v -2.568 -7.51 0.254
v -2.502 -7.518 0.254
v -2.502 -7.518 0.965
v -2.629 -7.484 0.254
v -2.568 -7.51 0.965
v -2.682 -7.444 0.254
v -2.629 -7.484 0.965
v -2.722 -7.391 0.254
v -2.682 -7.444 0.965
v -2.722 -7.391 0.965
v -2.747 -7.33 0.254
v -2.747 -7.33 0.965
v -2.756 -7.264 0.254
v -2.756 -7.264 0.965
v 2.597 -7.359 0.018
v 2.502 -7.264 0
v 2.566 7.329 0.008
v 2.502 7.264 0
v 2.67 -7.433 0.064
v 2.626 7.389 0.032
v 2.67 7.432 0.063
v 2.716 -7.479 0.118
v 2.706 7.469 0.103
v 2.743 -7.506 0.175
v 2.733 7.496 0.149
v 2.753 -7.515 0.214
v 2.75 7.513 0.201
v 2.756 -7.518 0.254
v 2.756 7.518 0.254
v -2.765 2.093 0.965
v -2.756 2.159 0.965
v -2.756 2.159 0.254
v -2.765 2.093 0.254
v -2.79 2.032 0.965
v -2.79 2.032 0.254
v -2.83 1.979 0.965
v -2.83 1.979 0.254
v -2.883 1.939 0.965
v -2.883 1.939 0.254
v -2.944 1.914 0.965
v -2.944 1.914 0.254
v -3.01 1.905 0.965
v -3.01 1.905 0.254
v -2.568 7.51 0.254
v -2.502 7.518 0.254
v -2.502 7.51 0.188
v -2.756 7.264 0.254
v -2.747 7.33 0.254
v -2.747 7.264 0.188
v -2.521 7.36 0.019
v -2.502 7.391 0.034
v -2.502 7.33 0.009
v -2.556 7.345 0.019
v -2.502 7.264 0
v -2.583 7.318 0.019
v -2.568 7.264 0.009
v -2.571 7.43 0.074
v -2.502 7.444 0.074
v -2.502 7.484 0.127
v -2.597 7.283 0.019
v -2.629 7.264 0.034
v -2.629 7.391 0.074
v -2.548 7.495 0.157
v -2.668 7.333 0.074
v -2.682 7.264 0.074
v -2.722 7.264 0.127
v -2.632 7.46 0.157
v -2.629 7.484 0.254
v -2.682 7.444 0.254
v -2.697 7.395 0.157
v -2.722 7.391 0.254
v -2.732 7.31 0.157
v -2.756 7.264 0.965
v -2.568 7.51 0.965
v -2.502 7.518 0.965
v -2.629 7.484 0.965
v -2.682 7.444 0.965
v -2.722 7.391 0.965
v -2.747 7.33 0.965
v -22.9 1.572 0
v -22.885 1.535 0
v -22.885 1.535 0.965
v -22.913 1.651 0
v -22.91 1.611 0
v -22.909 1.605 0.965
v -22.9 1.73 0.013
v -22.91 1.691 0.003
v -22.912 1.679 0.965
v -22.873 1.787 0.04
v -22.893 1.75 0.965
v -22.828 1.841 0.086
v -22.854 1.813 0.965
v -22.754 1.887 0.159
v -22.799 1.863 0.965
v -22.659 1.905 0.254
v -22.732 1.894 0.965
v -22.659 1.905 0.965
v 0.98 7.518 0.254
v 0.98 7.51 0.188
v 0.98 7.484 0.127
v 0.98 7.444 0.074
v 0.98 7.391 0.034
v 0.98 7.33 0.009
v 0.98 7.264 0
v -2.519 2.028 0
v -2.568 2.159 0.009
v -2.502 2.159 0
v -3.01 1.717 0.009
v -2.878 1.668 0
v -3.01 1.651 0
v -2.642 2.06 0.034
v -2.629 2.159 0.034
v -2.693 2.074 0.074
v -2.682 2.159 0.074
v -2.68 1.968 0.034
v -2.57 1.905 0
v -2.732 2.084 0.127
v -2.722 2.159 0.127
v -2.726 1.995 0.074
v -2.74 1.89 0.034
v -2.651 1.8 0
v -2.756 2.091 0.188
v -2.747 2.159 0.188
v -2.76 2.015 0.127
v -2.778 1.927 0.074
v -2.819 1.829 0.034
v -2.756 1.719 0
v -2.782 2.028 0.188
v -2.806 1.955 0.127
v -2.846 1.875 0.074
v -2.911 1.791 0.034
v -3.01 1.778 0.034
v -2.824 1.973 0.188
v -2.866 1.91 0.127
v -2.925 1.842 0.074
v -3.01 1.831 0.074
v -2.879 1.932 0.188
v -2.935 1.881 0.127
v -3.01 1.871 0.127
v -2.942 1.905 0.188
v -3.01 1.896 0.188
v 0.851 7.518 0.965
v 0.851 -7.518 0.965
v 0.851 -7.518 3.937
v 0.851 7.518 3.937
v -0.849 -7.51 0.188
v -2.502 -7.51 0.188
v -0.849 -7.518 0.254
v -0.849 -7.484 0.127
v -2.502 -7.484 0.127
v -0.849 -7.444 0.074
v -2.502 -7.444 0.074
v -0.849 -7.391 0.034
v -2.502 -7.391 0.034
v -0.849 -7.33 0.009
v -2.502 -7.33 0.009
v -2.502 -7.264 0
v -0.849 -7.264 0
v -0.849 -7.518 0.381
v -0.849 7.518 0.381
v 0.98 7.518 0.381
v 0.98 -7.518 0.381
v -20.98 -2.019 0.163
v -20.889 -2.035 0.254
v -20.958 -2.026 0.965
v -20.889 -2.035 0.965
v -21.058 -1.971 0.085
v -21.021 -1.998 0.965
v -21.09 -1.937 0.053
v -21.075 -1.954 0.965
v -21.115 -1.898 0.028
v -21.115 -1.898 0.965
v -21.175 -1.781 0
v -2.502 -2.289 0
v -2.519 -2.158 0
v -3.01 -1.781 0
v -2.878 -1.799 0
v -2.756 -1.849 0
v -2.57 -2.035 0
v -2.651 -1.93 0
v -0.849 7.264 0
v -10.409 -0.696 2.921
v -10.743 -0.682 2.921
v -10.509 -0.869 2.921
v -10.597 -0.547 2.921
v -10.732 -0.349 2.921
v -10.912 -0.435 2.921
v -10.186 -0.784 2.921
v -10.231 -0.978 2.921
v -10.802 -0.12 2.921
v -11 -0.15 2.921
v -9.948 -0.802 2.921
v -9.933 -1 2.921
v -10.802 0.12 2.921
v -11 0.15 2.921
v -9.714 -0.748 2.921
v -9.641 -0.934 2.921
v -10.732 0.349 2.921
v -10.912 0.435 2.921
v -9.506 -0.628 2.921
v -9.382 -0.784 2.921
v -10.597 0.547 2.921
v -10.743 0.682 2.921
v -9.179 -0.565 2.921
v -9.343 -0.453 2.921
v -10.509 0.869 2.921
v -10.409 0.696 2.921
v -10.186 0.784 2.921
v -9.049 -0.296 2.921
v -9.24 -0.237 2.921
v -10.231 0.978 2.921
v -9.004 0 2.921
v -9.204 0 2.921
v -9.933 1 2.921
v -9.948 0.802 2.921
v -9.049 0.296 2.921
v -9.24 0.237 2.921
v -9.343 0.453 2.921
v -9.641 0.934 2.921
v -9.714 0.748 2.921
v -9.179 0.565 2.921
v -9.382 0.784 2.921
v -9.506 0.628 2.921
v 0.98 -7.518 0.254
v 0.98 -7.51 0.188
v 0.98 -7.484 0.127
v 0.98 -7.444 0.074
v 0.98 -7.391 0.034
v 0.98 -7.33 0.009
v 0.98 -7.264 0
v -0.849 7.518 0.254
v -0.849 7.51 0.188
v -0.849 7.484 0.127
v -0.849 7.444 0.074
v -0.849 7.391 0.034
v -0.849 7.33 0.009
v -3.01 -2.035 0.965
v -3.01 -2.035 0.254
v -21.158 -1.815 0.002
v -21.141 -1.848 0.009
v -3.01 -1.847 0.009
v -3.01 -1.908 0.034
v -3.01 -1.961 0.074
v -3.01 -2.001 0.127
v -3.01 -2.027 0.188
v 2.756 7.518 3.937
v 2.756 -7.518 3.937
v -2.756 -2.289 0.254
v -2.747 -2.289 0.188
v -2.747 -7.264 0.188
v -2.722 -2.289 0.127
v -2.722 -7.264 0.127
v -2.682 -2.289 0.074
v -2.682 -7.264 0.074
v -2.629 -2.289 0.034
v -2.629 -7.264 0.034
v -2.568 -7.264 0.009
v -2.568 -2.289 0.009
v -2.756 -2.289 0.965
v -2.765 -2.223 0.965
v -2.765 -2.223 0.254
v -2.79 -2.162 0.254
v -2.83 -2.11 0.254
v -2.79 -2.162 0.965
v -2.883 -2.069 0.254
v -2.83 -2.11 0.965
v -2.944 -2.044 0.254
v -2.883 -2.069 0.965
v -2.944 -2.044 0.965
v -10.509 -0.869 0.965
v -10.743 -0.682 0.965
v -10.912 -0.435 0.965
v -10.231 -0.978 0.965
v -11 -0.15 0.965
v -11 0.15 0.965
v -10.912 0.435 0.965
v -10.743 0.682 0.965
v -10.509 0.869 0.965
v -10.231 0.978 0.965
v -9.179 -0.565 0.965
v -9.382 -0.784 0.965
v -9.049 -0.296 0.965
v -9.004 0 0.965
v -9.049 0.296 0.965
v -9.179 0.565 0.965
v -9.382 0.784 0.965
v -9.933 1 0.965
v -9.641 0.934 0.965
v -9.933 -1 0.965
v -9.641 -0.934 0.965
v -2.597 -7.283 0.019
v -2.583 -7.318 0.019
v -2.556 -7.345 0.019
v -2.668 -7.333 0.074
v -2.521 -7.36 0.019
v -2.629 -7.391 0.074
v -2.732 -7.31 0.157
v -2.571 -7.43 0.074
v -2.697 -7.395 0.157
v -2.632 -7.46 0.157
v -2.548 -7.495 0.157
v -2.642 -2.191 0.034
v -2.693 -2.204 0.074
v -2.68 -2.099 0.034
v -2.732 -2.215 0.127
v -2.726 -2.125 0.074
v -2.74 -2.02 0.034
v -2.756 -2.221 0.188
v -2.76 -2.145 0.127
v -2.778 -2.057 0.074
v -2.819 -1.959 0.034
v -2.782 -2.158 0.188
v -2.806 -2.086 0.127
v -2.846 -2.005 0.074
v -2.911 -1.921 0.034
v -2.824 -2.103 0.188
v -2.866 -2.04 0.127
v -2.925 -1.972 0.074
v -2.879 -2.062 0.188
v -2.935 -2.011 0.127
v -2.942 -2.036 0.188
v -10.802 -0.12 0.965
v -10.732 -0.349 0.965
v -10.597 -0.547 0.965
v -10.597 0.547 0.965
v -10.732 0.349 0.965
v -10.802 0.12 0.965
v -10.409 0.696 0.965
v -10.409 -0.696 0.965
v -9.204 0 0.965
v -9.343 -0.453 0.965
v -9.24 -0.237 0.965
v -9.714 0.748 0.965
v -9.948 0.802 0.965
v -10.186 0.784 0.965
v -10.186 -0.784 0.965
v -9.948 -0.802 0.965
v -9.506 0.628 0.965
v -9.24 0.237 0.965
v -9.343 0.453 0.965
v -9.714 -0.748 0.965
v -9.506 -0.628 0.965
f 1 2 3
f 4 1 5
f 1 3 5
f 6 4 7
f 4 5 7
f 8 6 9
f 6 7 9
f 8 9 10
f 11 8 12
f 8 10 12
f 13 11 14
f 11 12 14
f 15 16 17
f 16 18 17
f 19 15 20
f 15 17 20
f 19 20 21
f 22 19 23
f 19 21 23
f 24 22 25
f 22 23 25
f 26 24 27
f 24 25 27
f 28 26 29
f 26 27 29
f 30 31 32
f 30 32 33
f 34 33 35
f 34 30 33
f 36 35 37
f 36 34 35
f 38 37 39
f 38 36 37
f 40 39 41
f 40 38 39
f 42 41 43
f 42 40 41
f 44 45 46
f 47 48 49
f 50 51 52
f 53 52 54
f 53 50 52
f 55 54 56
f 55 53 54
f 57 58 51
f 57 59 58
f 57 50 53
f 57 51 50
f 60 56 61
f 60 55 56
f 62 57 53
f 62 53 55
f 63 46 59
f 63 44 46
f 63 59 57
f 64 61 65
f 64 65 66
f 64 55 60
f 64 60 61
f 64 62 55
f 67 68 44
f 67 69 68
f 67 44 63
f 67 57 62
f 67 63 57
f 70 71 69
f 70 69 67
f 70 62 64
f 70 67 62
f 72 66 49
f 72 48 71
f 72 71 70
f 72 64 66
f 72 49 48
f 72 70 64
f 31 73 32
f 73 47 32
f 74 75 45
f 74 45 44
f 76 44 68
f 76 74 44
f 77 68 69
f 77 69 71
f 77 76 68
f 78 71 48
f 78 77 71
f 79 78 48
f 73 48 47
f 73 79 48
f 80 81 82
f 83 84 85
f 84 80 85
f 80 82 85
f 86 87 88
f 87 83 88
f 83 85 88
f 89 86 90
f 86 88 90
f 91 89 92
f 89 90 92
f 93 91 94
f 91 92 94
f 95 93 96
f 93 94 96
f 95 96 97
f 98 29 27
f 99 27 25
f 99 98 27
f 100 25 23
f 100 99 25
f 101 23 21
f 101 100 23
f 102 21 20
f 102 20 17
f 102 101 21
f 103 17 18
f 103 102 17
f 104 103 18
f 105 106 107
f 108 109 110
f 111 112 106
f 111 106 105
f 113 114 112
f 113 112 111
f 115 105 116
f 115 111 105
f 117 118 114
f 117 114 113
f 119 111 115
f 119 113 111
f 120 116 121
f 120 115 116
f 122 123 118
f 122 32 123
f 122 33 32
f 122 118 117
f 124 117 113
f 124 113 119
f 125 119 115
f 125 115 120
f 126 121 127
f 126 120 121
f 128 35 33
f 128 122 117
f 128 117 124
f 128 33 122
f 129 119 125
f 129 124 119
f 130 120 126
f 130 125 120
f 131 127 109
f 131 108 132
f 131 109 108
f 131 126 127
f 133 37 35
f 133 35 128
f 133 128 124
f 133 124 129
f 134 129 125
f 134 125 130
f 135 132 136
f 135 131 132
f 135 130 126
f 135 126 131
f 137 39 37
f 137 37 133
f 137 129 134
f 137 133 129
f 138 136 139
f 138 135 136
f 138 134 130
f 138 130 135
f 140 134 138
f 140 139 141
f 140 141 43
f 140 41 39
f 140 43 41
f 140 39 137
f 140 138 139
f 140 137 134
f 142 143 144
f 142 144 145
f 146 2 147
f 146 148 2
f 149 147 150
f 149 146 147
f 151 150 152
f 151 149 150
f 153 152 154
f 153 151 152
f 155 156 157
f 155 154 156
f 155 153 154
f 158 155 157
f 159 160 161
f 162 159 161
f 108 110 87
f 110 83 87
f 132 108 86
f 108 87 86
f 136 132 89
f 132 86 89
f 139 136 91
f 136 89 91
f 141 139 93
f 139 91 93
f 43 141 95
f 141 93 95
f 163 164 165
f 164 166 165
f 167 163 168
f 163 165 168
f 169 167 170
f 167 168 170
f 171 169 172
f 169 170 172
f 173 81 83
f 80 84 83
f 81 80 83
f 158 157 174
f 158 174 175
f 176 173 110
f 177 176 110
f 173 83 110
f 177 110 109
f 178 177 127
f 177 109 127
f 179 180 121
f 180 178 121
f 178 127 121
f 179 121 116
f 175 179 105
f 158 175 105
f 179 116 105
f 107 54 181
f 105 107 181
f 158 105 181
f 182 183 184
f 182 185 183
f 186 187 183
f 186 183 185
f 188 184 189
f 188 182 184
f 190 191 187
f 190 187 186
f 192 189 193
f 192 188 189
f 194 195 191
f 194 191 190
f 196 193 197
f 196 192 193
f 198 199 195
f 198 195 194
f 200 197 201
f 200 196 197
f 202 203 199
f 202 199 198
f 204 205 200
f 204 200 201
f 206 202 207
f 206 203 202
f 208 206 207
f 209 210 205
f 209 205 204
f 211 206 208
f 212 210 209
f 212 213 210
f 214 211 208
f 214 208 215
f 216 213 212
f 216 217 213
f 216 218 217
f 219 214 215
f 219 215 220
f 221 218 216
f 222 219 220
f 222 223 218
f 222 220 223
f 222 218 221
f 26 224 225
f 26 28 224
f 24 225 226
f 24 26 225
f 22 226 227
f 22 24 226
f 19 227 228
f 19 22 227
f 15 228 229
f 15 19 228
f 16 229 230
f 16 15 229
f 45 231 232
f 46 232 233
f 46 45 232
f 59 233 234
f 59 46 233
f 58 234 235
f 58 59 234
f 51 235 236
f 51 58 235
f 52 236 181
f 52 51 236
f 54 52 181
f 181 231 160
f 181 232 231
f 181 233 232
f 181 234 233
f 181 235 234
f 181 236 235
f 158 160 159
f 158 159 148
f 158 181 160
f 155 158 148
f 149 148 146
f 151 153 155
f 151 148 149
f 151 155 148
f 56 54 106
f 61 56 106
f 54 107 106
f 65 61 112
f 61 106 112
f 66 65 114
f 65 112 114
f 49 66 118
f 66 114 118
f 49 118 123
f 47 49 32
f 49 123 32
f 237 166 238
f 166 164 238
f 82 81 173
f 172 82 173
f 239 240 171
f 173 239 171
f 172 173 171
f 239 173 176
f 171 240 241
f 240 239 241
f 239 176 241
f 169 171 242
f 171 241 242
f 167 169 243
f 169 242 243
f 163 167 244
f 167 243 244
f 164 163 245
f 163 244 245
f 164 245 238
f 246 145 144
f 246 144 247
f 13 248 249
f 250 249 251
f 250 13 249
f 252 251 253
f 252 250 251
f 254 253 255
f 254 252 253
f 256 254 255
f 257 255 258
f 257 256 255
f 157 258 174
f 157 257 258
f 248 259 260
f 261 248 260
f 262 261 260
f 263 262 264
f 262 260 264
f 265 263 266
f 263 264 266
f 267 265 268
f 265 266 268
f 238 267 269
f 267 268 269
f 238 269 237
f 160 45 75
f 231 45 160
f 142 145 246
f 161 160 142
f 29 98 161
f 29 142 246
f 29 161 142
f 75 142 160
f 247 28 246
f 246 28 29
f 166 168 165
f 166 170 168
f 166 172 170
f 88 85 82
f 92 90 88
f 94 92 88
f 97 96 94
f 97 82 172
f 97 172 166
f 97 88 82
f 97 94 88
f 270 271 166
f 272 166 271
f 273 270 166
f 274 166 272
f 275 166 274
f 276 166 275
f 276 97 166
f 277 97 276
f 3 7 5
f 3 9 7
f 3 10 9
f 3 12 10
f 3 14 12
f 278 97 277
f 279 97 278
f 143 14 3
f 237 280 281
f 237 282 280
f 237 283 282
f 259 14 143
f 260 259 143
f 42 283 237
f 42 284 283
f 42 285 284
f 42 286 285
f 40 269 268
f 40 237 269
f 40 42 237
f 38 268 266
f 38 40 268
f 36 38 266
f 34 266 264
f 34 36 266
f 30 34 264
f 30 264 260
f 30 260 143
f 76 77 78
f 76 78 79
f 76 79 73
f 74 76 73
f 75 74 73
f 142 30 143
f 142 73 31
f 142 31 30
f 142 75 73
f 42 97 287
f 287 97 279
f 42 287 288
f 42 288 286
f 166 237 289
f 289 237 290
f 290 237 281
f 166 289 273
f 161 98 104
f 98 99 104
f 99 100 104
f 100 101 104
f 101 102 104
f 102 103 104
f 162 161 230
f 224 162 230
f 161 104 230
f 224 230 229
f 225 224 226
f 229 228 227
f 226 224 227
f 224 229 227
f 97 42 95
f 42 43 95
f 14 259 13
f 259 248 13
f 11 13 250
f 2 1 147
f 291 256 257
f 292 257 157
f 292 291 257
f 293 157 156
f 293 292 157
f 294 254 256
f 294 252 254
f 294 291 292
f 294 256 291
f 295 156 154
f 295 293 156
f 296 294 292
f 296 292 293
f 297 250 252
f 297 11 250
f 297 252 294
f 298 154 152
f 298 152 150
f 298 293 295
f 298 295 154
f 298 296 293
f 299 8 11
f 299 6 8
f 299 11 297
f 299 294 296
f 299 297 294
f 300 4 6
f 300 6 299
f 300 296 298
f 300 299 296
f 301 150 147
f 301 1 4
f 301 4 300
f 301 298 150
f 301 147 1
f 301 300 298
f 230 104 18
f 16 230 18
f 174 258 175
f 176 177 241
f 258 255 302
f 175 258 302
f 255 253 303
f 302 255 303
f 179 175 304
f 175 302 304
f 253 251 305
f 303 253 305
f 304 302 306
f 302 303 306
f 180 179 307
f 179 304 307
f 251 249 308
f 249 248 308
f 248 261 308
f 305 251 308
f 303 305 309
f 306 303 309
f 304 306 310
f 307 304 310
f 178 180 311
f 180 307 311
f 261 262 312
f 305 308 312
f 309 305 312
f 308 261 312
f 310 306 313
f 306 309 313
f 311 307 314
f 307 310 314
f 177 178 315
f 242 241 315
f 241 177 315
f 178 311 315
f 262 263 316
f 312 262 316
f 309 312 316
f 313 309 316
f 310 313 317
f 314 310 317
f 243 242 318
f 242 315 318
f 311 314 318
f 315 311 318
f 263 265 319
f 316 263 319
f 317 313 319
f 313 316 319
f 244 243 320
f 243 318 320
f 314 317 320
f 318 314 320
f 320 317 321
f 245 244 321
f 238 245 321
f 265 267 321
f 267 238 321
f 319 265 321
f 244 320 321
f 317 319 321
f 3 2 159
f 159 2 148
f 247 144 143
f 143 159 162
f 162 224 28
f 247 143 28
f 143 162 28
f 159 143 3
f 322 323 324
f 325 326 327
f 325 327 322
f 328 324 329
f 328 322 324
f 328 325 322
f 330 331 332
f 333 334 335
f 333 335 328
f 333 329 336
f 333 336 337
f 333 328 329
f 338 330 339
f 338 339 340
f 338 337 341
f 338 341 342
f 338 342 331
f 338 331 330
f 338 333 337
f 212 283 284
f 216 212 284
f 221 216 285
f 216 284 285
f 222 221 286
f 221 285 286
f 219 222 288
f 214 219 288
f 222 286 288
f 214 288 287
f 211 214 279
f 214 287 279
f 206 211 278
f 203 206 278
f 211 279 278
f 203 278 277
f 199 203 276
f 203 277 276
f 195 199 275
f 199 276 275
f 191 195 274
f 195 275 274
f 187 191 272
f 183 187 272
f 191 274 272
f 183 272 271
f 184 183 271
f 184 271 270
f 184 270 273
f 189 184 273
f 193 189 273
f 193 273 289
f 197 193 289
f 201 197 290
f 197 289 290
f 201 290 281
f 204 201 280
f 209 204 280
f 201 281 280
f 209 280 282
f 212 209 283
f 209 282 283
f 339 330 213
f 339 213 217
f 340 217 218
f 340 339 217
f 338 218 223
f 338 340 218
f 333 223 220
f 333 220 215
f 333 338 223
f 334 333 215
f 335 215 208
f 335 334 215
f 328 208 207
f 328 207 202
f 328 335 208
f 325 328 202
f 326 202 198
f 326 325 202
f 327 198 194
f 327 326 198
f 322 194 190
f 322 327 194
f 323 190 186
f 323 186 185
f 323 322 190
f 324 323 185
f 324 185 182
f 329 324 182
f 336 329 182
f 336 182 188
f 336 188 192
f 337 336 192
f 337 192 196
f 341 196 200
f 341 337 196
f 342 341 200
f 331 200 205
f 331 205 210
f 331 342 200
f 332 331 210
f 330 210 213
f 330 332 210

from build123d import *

# Parameters (mm, degrees)
F1_DEPTH = 0.9652
F2_W     = 1.905
F2_H     = 15.0368
F3_DEPTH = 2.9718
F2_R     = 1.0033
F2_R_2   = 0.8037883442
F4_DEPTH = 1.9558
F5_W     = 1.8288
F5_H     = 15.0368
F6_DEPTH = 0.381
F7_R     = 0.254


with BuildPart() as f1:
    # F0 (on Top) → F1 (new body)
    with BuildSketch(Plane.XY):
        Polygon((-2.7559, -7.5184), (2.7559, -7.5184), (2.7559, 7.5184), (0.8509, 7.5184), (-2.7559, 7.5184), (-2.7559, 1.905), (-23.0759, 1.905), (-21.0439, -2.035223273), (-2.7559, -2.035223273), align=None)
    extrude(amount=F1_DEPTH)

    # F2 (on face) → F3 (join)
    with BuildSketch(Plane.XY.offset(0.9652)):
        with Locations((1.8034, 0)):
            Rectangle(F2_W, F2_H)
    extrude(amount=F3_DEPTH)

    # F2 (on face) → F4 (join)
    with BuildSketch(Plane.XY.offset(0.9652)):
        with Locations((-10.0076, 0)):
            Circle(F2_R)
        with Locations((-10.0076, 0)):
            Circle(F2_R_2, mode=Mode.SUBTRACT)
    extrude(amount=F4_DEPTH)

    # F5 (on face) → F6 (cut)
    with BuildSketch(Plane(origin=(0, 0, 0), x_dir=(1, 0, 0), z_dir=(0, 0, -1))):
        with Locations((0.0654817199, 0)):
            Rectangle(F5_W, F5_H)
    extrude(amount=-F6_DEPTH, mode=Mode.SUBTRACT)

    # F7
    f7_edges = [f1.edges().sort_by_distance(p)[0] for p in [
        (-23.0759, 1.905, 0.4826),
        (-21.0439, -2.035223, 0.4826),
        (-2.7559, -7.5184, 0.4826),
        (-2.7559, 7.5184, 0.4826),
        (-2.7559, -2.035223, 0.4826),
        (-2.7559, 1.905, 0.4826),
        (-1.802409, 7.5184, 0),
        (1.867891, 7.5184, 0),
        (2.7559, 0, 0),
        (-2.7559, 4.7117, 0),
        (-2.7559, -4.776812, 0),
        (-1.802409, -7.5184, 0),
        (1.867891, -7.5184, 0),
        (-11.8999, -2.035223, 0),
        (-12.9159, 1.905, 0),
    ]]
    fillet(f7_edges, radius=F7_R)


solid = f1.part
